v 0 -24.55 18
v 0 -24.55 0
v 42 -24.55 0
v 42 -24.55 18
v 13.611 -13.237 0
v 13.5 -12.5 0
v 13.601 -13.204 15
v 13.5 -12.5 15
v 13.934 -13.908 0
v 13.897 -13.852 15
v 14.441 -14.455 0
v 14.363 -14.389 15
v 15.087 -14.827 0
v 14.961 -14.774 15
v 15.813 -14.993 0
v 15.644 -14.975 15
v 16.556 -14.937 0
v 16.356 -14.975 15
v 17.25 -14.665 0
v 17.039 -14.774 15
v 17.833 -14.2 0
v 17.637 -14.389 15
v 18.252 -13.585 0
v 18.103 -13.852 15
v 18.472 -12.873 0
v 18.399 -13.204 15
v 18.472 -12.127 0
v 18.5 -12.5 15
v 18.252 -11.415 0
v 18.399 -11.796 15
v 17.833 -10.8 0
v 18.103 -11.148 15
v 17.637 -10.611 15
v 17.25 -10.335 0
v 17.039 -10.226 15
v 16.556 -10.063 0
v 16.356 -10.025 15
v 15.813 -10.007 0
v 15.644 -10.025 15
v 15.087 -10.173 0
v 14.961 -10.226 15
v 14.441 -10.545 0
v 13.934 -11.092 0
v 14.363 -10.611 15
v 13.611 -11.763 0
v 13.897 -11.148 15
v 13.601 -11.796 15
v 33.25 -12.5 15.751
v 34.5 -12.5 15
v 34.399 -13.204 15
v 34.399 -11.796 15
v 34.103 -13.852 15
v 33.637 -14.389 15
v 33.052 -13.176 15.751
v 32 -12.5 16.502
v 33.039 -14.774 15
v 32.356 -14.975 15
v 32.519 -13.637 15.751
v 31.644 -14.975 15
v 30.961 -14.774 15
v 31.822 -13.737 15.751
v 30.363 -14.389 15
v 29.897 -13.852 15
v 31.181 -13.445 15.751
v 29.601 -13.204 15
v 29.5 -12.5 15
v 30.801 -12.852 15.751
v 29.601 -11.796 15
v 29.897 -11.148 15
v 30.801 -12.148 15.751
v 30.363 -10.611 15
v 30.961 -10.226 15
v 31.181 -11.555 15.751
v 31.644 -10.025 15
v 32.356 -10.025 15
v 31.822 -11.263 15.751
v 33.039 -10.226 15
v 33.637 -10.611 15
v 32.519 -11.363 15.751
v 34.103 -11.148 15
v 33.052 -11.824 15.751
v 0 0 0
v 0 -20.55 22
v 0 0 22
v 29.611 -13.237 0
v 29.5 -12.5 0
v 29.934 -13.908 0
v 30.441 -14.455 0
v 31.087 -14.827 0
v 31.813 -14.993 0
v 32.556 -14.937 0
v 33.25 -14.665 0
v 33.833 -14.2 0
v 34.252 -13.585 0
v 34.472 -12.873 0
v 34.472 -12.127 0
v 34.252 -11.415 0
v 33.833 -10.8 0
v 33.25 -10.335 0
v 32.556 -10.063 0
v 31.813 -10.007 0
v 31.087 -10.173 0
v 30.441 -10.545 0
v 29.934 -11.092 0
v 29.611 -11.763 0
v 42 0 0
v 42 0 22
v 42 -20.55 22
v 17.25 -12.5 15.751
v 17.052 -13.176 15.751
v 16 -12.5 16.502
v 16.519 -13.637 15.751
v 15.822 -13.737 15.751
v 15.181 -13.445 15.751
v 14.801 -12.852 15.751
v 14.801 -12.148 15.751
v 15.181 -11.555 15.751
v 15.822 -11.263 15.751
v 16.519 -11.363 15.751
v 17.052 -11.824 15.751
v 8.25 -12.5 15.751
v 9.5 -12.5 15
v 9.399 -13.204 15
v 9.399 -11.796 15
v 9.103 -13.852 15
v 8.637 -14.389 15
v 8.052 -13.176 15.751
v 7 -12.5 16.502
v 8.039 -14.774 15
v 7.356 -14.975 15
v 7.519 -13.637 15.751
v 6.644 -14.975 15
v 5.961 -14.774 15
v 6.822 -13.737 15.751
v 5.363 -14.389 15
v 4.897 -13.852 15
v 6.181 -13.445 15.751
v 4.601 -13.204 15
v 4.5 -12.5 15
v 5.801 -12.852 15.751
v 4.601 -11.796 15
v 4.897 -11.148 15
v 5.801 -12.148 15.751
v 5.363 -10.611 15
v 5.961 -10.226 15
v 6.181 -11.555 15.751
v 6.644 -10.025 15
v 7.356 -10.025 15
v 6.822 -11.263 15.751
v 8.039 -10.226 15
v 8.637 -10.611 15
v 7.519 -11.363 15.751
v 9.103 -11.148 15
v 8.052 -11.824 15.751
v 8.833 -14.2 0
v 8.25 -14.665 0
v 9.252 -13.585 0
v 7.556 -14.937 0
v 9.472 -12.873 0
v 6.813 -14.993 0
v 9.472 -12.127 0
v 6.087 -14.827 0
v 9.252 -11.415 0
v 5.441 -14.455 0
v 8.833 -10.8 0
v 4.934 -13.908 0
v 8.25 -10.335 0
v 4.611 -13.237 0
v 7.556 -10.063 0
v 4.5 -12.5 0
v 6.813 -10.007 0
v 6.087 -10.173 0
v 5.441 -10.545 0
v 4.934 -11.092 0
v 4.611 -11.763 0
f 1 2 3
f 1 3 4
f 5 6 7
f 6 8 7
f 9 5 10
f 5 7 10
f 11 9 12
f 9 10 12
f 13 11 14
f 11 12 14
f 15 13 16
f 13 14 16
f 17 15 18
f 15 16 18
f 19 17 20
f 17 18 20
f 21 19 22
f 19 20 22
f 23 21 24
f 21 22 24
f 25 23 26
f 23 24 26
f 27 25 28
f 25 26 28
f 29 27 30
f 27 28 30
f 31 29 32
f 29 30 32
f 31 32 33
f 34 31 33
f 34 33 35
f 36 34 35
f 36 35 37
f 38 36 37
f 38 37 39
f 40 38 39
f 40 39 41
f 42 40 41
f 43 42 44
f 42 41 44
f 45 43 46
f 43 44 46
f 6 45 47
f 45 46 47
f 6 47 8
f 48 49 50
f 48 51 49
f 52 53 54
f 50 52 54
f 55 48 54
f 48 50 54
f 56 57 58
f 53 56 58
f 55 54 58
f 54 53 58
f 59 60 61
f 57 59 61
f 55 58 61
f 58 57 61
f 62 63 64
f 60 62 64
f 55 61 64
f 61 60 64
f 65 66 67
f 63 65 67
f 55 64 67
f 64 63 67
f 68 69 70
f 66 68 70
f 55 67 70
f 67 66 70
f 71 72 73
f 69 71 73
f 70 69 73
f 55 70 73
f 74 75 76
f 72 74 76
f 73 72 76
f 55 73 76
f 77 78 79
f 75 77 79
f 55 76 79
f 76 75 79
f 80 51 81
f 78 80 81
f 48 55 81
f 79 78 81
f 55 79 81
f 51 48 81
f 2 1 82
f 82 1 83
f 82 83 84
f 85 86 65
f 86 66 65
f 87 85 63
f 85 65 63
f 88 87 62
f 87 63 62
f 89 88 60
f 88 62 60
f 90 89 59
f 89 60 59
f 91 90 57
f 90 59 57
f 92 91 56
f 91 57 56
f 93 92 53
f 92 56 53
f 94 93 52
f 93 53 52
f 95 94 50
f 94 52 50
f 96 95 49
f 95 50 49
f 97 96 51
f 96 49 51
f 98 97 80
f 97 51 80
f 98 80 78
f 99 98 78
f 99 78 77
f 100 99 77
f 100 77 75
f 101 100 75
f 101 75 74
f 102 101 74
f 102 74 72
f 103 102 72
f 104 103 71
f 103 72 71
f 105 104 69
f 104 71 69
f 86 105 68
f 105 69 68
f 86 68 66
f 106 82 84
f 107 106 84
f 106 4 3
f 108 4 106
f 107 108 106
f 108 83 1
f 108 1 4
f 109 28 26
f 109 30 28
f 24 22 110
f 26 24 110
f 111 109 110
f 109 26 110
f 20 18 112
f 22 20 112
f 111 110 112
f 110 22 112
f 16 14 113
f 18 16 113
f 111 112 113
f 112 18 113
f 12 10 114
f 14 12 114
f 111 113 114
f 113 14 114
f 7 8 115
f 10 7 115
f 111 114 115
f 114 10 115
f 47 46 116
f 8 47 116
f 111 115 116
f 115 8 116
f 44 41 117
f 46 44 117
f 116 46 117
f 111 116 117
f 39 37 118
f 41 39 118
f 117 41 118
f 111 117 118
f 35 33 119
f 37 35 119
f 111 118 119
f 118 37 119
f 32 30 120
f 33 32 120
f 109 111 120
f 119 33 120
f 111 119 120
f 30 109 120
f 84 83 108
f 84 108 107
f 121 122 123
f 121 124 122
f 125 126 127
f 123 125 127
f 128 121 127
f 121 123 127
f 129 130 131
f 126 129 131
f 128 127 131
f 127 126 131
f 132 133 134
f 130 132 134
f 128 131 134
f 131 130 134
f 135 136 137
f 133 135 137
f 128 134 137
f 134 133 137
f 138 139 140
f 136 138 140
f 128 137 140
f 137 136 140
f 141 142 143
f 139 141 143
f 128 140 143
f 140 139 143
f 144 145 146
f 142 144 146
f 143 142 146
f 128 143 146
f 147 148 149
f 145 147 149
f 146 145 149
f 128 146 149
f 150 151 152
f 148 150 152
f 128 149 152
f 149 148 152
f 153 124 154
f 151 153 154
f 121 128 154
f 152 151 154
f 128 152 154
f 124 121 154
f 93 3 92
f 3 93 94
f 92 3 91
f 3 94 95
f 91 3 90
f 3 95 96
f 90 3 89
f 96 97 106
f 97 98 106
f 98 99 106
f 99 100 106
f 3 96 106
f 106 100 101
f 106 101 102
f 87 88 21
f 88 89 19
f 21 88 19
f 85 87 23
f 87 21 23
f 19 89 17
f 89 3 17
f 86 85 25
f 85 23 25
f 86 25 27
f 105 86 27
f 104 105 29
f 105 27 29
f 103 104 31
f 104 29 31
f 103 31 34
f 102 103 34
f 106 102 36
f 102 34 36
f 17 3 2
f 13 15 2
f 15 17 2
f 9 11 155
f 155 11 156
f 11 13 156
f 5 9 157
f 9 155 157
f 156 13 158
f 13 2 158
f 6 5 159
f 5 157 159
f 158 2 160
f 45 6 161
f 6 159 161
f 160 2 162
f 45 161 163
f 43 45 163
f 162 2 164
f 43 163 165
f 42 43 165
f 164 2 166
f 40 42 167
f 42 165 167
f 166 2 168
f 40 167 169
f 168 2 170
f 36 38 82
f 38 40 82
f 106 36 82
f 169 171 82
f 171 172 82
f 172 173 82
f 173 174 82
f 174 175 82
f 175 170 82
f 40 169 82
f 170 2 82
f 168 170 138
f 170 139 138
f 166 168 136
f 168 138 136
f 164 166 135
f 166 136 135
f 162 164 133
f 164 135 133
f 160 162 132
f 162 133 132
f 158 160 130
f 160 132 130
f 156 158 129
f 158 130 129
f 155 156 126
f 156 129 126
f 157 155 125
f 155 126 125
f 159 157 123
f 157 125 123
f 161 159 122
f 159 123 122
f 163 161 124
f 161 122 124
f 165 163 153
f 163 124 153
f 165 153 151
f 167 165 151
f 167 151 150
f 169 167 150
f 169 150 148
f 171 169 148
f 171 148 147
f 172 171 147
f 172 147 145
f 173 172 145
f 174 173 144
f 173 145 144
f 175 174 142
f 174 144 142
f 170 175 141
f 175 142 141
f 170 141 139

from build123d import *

# Parameters (mm, degrees)
F0_W     = 24.55
F0_H     = 22
F1_DEPTH = 42
F2_SIZE  = 4
F4_D     = 5
F4_DEPTH = 15
F4_TIP   = 1.5021515476


with BuildPart() as f1:
    # F0 (on Right) → F1 (new body)
    with BuildSketch(Plane.YZ):
        with Locations((-12.275, 11)):
            Rectangle(F0_W, F0_H)
    extrude(amount=F1_DEPTH)

    # F2
    f2_edges = [f1.edges().sort_by_distance(p)[0] for p in [
        (21, -24.55, 22),
    ]]
    chamfer(f2_edges, length=F2_SIZE)

    # F4
    with Locations(Plane(origin=(0, 0, 0), x_dir=(1, 0, 0), z_dir=(0, 0, -1))):
        with Locations((32, 12.5), (16, 12.5), (7, 12.5)):
            Hole(F4_D / 2, depth=F4_DEPTH)
            with Locations((0, 0, -(F4_DEPTH + F4_TIP / 2))):  # 118° drill point
                Cone(0, F4_D / 2, F4_TIP, mode=Mode.SUBTRACT)


solid = f1.part
